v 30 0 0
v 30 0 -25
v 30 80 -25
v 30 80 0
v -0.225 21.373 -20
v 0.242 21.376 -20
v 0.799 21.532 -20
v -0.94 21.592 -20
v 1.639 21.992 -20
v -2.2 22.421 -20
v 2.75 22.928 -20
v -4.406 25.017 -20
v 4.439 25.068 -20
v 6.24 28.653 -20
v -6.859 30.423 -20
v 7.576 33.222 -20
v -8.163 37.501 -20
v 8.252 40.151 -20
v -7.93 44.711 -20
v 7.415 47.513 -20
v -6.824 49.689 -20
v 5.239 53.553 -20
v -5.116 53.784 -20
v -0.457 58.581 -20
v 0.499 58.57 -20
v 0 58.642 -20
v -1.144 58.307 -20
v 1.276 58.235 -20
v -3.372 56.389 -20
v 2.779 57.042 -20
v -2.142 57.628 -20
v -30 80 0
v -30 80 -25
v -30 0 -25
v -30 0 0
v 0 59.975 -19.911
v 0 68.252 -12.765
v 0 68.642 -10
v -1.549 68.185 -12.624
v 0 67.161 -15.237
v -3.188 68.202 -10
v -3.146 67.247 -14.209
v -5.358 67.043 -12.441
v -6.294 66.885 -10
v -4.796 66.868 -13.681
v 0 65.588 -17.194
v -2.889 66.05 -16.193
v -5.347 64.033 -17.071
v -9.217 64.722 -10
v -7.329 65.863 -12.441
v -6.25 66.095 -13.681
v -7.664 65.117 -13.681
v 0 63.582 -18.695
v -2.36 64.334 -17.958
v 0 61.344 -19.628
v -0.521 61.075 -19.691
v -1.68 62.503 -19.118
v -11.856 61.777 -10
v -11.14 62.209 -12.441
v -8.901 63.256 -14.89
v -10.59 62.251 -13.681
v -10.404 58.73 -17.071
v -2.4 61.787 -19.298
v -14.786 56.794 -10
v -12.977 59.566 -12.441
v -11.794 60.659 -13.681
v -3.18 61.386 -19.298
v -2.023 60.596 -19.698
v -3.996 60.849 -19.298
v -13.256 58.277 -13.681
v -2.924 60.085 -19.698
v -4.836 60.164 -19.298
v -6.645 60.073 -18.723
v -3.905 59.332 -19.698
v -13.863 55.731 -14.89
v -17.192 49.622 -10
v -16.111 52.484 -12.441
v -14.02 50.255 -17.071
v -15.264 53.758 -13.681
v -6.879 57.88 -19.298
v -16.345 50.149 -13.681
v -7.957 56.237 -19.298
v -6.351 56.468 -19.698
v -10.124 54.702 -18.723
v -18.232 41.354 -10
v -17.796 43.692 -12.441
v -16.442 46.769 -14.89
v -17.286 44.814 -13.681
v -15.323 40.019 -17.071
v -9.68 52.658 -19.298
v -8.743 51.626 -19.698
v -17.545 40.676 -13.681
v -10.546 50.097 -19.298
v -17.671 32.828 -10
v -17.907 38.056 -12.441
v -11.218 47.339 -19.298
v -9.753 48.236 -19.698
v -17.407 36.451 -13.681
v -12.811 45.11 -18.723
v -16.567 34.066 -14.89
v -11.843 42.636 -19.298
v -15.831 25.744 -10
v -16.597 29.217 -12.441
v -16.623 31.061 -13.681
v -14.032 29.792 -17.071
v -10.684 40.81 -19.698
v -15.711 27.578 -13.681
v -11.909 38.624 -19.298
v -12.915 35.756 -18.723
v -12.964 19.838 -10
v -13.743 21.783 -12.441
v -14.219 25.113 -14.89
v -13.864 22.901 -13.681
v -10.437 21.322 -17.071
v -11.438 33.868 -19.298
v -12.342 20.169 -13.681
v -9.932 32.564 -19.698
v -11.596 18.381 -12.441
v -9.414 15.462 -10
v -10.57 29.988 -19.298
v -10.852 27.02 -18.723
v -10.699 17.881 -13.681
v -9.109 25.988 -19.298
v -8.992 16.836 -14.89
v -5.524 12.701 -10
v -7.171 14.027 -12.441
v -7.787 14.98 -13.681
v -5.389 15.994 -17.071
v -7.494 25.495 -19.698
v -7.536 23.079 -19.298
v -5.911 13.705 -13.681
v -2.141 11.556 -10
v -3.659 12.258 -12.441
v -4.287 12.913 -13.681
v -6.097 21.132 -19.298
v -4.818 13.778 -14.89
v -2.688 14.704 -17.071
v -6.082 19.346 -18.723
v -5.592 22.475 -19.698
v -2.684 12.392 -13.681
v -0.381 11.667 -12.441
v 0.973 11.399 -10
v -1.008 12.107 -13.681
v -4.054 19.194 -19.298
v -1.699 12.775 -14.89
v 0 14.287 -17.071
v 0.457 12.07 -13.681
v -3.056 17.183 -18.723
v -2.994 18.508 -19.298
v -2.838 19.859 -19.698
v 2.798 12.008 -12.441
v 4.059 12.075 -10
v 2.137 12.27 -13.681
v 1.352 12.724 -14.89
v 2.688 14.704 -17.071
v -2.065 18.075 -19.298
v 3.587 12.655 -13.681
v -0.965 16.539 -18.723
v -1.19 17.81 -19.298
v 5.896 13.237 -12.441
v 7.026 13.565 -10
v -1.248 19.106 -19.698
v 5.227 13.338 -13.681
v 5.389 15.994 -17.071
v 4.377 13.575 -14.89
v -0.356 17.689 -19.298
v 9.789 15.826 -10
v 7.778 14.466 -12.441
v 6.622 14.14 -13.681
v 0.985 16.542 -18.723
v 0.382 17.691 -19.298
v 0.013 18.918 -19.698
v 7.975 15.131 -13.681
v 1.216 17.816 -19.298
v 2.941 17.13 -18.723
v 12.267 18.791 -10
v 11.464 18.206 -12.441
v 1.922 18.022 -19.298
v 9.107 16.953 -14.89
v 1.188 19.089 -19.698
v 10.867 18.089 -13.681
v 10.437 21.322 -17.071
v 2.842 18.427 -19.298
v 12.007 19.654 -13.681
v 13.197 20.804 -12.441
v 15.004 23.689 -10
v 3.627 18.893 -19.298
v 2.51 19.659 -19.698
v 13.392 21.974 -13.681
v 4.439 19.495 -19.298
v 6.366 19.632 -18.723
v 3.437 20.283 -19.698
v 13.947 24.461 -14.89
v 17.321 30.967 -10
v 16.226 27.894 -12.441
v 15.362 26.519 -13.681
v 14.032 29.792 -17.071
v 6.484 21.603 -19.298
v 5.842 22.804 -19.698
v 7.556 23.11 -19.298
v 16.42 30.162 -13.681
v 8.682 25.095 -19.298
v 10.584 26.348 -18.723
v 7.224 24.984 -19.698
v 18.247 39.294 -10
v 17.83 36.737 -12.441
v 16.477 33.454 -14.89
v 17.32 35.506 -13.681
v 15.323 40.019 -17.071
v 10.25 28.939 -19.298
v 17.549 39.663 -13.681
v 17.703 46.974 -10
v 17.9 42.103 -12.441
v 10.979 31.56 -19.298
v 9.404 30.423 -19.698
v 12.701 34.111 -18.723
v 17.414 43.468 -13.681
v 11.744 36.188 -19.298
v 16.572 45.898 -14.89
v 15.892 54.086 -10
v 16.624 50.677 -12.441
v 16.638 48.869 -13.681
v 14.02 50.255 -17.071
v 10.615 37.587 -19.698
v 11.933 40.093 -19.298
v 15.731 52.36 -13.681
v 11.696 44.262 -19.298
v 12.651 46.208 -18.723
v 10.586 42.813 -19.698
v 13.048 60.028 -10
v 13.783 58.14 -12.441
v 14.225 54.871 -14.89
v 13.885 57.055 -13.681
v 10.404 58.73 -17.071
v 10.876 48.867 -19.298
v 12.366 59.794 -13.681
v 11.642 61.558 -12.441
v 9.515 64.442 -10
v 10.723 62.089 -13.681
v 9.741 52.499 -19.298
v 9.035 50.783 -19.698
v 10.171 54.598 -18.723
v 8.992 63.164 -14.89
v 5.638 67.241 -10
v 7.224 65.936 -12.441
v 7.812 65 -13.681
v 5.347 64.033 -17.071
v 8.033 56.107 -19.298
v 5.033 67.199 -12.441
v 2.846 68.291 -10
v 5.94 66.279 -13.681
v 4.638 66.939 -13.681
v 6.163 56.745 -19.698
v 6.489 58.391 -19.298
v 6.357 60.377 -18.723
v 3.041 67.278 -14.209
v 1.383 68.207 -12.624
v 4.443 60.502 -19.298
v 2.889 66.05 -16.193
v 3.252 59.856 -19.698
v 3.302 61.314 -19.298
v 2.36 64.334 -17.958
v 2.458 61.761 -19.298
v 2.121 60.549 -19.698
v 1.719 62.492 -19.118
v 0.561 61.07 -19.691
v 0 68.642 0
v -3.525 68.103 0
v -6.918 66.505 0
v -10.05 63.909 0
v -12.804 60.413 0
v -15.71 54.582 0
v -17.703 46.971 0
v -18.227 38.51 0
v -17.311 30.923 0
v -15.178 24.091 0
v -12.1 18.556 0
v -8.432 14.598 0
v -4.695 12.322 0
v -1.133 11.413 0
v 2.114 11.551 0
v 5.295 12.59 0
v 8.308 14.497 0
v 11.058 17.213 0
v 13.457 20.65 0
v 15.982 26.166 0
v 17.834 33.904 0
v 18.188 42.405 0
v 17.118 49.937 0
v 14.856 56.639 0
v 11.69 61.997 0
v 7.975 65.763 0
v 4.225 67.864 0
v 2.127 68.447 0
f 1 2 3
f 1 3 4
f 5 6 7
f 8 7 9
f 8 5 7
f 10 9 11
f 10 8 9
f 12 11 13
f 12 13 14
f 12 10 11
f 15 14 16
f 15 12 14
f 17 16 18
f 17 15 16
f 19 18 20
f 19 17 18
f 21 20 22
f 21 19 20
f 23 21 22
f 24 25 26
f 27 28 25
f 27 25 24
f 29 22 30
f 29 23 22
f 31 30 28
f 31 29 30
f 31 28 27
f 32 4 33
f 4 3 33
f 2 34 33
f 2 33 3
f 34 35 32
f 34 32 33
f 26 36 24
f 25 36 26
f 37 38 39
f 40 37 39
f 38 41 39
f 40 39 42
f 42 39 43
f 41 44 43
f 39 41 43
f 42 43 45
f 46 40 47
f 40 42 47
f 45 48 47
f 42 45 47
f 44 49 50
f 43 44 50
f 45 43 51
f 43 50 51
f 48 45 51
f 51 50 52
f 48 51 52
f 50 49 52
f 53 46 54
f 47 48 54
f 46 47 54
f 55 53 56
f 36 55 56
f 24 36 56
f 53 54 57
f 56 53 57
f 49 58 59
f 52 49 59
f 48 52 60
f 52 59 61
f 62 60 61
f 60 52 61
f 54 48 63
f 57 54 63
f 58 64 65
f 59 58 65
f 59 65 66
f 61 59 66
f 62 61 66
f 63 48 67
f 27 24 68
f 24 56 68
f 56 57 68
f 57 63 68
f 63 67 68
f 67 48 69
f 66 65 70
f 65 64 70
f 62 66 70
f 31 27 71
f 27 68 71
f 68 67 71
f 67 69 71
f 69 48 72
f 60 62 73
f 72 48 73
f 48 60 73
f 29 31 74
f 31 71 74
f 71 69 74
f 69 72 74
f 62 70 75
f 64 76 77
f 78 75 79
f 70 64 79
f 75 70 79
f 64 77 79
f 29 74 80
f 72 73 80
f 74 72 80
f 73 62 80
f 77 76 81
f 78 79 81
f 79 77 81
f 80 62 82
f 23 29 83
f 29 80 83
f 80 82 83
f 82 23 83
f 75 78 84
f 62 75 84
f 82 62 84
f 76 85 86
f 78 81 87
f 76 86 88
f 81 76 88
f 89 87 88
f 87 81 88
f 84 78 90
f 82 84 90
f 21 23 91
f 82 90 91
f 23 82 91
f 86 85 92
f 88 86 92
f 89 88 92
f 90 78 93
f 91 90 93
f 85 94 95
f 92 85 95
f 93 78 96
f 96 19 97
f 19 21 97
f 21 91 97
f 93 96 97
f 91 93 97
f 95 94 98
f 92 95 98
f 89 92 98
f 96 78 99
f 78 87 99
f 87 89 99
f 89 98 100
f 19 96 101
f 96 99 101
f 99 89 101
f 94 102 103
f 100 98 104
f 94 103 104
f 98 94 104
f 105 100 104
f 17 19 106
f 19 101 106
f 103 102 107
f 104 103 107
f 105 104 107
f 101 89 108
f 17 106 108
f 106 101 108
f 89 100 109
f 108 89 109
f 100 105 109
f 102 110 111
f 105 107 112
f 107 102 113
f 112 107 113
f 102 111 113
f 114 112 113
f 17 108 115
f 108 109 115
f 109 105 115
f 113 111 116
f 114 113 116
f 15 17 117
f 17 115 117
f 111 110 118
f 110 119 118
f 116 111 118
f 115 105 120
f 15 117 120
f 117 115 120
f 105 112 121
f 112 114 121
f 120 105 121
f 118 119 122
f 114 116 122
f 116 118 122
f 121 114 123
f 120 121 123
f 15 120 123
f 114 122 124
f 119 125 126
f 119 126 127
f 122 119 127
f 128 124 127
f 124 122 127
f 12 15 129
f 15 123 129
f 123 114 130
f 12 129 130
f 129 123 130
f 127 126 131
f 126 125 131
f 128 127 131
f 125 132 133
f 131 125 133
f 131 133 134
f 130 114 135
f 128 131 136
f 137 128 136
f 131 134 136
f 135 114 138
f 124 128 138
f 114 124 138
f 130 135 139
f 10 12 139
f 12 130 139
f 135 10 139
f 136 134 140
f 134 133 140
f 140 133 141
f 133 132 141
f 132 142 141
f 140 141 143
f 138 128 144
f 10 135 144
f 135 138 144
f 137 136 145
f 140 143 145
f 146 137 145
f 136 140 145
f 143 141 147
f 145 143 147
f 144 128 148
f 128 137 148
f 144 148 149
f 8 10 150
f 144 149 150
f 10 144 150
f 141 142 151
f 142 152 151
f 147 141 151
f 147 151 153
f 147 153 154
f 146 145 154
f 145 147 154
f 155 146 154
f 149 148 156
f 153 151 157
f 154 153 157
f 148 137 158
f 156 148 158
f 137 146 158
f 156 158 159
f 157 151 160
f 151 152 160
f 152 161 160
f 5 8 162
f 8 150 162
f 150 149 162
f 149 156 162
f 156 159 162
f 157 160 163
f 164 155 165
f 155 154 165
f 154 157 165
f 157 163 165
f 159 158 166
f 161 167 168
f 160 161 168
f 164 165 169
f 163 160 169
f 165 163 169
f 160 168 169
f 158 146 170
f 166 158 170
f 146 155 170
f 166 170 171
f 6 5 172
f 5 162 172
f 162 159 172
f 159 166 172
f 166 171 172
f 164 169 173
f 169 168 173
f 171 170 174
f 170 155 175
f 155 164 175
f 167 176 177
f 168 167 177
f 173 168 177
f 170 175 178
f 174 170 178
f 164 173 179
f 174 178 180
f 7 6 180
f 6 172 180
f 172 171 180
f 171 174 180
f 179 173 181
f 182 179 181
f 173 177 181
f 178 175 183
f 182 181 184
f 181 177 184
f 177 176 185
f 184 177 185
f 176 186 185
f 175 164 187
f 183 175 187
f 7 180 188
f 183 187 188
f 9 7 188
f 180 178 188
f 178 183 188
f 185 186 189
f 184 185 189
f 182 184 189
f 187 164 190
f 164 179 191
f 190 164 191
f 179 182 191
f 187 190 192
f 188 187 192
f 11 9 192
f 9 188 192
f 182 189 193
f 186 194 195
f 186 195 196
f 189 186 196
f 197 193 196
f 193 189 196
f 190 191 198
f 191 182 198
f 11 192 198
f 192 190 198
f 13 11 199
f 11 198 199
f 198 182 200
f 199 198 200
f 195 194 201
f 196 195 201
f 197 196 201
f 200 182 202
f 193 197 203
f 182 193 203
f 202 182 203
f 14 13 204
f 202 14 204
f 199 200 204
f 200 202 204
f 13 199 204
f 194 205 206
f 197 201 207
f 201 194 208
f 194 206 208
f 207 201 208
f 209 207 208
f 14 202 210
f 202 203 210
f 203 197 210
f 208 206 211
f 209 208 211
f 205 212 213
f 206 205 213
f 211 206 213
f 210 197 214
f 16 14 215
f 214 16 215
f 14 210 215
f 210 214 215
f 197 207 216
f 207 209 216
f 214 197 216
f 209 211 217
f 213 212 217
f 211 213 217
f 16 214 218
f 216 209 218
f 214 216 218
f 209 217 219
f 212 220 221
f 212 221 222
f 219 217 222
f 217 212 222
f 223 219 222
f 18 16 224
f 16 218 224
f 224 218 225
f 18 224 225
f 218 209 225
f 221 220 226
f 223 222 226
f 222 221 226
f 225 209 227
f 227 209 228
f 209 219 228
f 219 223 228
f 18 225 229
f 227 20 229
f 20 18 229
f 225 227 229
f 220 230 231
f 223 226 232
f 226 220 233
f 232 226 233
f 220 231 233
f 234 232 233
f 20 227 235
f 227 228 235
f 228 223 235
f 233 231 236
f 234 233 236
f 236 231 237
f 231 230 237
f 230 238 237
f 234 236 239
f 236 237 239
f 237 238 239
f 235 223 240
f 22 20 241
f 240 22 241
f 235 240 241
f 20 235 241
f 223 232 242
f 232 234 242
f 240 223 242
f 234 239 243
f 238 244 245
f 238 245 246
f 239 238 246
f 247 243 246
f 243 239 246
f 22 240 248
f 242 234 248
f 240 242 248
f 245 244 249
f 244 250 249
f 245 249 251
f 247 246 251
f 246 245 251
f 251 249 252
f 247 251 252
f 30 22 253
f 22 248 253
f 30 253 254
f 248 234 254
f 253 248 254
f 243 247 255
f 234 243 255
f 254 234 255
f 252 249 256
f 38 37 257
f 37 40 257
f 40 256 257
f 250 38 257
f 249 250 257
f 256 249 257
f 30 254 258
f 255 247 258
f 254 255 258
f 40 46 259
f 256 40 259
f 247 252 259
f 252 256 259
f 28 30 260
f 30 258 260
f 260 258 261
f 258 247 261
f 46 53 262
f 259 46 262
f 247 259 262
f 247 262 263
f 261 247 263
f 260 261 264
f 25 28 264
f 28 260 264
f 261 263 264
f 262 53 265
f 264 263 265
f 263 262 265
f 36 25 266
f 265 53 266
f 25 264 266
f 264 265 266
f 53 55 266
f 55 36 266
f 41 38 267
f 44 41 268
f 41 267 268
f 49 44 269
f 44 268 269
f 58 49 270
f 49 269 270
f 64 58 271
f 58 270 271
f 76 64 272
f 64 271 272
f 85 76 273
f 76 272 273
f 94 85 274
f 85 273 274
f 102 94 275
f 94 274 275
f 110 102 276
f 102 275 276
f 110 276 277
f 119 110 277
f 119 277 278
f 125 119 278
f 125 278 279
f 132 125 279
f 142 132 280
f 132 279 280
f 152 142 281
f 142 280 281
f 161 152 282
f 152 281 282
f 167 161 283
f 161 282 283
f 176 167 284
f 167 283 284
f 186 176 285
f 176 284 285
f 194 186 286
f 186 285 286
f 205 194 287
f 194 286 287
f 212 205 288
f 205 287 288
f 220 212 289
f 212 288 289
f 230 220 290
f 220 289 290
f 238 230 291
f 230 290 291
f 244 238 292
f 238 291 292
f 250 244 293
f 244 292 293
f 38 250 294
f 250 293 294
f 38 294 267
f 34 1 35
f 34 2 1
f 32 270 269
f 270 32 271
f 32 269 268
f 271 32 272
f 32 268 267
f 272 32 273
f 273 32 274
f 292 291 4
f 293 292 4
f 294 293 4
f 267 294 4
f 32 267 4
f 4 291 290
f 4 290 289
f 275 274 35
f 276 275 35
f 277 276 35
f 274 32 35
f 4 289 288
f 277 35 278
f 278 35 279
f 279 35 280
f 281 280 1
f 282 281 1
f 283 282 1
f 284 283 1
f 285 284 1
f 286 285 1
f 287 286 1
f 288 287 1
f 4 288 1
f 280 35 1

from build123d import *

# Parameters (mm, degrees)
SALIENTE_EXTRUIR1_DEPTH = 80
CROQUIS2_RX             = 28.641945325
CROQUIS2_RY             = 18.2521978
CORTAR_EXTRUIR1_DEPTH   = 20
REDONDEO1_R             = 10


with BuildPart() as part:
    # Croquis1 → Saliente-Extruir1 (new body)
    with BuildSketch(Plane(origin=(0, 0, 0), x_dir=(1, 0, 0), z_dir=(0, 1, 0))):
        Polygon((0, 0), (-30, 0), (-30, 25), (30, 25), (30, 0), align=None)
    extrude(amount=SALIENTE_EXTRUIR1_DEPTH)

    # Croquis2 → Cortar-Extruir1 (cut)
    with BuildSketch(Plane.XY):
        with Locations(Location((0, 40), (0, 0, 90))):
            Ellipse(CROQUIS2_RX, CROQUIS2_RY)
    extrude(amount=-CORTAR_EXTRUIR1_DEPTH, mode=Mode.SUBTRACT)

    # Redondeo1
    redondeo1_edges = [part.edges().sort_by_distance(p)[0] for p in [
        (0.027512659, 11.358087214, -20),
    ]]
    fillet(redondeo1_edges, radius=REDONDEO1_R)


solid = part.part
